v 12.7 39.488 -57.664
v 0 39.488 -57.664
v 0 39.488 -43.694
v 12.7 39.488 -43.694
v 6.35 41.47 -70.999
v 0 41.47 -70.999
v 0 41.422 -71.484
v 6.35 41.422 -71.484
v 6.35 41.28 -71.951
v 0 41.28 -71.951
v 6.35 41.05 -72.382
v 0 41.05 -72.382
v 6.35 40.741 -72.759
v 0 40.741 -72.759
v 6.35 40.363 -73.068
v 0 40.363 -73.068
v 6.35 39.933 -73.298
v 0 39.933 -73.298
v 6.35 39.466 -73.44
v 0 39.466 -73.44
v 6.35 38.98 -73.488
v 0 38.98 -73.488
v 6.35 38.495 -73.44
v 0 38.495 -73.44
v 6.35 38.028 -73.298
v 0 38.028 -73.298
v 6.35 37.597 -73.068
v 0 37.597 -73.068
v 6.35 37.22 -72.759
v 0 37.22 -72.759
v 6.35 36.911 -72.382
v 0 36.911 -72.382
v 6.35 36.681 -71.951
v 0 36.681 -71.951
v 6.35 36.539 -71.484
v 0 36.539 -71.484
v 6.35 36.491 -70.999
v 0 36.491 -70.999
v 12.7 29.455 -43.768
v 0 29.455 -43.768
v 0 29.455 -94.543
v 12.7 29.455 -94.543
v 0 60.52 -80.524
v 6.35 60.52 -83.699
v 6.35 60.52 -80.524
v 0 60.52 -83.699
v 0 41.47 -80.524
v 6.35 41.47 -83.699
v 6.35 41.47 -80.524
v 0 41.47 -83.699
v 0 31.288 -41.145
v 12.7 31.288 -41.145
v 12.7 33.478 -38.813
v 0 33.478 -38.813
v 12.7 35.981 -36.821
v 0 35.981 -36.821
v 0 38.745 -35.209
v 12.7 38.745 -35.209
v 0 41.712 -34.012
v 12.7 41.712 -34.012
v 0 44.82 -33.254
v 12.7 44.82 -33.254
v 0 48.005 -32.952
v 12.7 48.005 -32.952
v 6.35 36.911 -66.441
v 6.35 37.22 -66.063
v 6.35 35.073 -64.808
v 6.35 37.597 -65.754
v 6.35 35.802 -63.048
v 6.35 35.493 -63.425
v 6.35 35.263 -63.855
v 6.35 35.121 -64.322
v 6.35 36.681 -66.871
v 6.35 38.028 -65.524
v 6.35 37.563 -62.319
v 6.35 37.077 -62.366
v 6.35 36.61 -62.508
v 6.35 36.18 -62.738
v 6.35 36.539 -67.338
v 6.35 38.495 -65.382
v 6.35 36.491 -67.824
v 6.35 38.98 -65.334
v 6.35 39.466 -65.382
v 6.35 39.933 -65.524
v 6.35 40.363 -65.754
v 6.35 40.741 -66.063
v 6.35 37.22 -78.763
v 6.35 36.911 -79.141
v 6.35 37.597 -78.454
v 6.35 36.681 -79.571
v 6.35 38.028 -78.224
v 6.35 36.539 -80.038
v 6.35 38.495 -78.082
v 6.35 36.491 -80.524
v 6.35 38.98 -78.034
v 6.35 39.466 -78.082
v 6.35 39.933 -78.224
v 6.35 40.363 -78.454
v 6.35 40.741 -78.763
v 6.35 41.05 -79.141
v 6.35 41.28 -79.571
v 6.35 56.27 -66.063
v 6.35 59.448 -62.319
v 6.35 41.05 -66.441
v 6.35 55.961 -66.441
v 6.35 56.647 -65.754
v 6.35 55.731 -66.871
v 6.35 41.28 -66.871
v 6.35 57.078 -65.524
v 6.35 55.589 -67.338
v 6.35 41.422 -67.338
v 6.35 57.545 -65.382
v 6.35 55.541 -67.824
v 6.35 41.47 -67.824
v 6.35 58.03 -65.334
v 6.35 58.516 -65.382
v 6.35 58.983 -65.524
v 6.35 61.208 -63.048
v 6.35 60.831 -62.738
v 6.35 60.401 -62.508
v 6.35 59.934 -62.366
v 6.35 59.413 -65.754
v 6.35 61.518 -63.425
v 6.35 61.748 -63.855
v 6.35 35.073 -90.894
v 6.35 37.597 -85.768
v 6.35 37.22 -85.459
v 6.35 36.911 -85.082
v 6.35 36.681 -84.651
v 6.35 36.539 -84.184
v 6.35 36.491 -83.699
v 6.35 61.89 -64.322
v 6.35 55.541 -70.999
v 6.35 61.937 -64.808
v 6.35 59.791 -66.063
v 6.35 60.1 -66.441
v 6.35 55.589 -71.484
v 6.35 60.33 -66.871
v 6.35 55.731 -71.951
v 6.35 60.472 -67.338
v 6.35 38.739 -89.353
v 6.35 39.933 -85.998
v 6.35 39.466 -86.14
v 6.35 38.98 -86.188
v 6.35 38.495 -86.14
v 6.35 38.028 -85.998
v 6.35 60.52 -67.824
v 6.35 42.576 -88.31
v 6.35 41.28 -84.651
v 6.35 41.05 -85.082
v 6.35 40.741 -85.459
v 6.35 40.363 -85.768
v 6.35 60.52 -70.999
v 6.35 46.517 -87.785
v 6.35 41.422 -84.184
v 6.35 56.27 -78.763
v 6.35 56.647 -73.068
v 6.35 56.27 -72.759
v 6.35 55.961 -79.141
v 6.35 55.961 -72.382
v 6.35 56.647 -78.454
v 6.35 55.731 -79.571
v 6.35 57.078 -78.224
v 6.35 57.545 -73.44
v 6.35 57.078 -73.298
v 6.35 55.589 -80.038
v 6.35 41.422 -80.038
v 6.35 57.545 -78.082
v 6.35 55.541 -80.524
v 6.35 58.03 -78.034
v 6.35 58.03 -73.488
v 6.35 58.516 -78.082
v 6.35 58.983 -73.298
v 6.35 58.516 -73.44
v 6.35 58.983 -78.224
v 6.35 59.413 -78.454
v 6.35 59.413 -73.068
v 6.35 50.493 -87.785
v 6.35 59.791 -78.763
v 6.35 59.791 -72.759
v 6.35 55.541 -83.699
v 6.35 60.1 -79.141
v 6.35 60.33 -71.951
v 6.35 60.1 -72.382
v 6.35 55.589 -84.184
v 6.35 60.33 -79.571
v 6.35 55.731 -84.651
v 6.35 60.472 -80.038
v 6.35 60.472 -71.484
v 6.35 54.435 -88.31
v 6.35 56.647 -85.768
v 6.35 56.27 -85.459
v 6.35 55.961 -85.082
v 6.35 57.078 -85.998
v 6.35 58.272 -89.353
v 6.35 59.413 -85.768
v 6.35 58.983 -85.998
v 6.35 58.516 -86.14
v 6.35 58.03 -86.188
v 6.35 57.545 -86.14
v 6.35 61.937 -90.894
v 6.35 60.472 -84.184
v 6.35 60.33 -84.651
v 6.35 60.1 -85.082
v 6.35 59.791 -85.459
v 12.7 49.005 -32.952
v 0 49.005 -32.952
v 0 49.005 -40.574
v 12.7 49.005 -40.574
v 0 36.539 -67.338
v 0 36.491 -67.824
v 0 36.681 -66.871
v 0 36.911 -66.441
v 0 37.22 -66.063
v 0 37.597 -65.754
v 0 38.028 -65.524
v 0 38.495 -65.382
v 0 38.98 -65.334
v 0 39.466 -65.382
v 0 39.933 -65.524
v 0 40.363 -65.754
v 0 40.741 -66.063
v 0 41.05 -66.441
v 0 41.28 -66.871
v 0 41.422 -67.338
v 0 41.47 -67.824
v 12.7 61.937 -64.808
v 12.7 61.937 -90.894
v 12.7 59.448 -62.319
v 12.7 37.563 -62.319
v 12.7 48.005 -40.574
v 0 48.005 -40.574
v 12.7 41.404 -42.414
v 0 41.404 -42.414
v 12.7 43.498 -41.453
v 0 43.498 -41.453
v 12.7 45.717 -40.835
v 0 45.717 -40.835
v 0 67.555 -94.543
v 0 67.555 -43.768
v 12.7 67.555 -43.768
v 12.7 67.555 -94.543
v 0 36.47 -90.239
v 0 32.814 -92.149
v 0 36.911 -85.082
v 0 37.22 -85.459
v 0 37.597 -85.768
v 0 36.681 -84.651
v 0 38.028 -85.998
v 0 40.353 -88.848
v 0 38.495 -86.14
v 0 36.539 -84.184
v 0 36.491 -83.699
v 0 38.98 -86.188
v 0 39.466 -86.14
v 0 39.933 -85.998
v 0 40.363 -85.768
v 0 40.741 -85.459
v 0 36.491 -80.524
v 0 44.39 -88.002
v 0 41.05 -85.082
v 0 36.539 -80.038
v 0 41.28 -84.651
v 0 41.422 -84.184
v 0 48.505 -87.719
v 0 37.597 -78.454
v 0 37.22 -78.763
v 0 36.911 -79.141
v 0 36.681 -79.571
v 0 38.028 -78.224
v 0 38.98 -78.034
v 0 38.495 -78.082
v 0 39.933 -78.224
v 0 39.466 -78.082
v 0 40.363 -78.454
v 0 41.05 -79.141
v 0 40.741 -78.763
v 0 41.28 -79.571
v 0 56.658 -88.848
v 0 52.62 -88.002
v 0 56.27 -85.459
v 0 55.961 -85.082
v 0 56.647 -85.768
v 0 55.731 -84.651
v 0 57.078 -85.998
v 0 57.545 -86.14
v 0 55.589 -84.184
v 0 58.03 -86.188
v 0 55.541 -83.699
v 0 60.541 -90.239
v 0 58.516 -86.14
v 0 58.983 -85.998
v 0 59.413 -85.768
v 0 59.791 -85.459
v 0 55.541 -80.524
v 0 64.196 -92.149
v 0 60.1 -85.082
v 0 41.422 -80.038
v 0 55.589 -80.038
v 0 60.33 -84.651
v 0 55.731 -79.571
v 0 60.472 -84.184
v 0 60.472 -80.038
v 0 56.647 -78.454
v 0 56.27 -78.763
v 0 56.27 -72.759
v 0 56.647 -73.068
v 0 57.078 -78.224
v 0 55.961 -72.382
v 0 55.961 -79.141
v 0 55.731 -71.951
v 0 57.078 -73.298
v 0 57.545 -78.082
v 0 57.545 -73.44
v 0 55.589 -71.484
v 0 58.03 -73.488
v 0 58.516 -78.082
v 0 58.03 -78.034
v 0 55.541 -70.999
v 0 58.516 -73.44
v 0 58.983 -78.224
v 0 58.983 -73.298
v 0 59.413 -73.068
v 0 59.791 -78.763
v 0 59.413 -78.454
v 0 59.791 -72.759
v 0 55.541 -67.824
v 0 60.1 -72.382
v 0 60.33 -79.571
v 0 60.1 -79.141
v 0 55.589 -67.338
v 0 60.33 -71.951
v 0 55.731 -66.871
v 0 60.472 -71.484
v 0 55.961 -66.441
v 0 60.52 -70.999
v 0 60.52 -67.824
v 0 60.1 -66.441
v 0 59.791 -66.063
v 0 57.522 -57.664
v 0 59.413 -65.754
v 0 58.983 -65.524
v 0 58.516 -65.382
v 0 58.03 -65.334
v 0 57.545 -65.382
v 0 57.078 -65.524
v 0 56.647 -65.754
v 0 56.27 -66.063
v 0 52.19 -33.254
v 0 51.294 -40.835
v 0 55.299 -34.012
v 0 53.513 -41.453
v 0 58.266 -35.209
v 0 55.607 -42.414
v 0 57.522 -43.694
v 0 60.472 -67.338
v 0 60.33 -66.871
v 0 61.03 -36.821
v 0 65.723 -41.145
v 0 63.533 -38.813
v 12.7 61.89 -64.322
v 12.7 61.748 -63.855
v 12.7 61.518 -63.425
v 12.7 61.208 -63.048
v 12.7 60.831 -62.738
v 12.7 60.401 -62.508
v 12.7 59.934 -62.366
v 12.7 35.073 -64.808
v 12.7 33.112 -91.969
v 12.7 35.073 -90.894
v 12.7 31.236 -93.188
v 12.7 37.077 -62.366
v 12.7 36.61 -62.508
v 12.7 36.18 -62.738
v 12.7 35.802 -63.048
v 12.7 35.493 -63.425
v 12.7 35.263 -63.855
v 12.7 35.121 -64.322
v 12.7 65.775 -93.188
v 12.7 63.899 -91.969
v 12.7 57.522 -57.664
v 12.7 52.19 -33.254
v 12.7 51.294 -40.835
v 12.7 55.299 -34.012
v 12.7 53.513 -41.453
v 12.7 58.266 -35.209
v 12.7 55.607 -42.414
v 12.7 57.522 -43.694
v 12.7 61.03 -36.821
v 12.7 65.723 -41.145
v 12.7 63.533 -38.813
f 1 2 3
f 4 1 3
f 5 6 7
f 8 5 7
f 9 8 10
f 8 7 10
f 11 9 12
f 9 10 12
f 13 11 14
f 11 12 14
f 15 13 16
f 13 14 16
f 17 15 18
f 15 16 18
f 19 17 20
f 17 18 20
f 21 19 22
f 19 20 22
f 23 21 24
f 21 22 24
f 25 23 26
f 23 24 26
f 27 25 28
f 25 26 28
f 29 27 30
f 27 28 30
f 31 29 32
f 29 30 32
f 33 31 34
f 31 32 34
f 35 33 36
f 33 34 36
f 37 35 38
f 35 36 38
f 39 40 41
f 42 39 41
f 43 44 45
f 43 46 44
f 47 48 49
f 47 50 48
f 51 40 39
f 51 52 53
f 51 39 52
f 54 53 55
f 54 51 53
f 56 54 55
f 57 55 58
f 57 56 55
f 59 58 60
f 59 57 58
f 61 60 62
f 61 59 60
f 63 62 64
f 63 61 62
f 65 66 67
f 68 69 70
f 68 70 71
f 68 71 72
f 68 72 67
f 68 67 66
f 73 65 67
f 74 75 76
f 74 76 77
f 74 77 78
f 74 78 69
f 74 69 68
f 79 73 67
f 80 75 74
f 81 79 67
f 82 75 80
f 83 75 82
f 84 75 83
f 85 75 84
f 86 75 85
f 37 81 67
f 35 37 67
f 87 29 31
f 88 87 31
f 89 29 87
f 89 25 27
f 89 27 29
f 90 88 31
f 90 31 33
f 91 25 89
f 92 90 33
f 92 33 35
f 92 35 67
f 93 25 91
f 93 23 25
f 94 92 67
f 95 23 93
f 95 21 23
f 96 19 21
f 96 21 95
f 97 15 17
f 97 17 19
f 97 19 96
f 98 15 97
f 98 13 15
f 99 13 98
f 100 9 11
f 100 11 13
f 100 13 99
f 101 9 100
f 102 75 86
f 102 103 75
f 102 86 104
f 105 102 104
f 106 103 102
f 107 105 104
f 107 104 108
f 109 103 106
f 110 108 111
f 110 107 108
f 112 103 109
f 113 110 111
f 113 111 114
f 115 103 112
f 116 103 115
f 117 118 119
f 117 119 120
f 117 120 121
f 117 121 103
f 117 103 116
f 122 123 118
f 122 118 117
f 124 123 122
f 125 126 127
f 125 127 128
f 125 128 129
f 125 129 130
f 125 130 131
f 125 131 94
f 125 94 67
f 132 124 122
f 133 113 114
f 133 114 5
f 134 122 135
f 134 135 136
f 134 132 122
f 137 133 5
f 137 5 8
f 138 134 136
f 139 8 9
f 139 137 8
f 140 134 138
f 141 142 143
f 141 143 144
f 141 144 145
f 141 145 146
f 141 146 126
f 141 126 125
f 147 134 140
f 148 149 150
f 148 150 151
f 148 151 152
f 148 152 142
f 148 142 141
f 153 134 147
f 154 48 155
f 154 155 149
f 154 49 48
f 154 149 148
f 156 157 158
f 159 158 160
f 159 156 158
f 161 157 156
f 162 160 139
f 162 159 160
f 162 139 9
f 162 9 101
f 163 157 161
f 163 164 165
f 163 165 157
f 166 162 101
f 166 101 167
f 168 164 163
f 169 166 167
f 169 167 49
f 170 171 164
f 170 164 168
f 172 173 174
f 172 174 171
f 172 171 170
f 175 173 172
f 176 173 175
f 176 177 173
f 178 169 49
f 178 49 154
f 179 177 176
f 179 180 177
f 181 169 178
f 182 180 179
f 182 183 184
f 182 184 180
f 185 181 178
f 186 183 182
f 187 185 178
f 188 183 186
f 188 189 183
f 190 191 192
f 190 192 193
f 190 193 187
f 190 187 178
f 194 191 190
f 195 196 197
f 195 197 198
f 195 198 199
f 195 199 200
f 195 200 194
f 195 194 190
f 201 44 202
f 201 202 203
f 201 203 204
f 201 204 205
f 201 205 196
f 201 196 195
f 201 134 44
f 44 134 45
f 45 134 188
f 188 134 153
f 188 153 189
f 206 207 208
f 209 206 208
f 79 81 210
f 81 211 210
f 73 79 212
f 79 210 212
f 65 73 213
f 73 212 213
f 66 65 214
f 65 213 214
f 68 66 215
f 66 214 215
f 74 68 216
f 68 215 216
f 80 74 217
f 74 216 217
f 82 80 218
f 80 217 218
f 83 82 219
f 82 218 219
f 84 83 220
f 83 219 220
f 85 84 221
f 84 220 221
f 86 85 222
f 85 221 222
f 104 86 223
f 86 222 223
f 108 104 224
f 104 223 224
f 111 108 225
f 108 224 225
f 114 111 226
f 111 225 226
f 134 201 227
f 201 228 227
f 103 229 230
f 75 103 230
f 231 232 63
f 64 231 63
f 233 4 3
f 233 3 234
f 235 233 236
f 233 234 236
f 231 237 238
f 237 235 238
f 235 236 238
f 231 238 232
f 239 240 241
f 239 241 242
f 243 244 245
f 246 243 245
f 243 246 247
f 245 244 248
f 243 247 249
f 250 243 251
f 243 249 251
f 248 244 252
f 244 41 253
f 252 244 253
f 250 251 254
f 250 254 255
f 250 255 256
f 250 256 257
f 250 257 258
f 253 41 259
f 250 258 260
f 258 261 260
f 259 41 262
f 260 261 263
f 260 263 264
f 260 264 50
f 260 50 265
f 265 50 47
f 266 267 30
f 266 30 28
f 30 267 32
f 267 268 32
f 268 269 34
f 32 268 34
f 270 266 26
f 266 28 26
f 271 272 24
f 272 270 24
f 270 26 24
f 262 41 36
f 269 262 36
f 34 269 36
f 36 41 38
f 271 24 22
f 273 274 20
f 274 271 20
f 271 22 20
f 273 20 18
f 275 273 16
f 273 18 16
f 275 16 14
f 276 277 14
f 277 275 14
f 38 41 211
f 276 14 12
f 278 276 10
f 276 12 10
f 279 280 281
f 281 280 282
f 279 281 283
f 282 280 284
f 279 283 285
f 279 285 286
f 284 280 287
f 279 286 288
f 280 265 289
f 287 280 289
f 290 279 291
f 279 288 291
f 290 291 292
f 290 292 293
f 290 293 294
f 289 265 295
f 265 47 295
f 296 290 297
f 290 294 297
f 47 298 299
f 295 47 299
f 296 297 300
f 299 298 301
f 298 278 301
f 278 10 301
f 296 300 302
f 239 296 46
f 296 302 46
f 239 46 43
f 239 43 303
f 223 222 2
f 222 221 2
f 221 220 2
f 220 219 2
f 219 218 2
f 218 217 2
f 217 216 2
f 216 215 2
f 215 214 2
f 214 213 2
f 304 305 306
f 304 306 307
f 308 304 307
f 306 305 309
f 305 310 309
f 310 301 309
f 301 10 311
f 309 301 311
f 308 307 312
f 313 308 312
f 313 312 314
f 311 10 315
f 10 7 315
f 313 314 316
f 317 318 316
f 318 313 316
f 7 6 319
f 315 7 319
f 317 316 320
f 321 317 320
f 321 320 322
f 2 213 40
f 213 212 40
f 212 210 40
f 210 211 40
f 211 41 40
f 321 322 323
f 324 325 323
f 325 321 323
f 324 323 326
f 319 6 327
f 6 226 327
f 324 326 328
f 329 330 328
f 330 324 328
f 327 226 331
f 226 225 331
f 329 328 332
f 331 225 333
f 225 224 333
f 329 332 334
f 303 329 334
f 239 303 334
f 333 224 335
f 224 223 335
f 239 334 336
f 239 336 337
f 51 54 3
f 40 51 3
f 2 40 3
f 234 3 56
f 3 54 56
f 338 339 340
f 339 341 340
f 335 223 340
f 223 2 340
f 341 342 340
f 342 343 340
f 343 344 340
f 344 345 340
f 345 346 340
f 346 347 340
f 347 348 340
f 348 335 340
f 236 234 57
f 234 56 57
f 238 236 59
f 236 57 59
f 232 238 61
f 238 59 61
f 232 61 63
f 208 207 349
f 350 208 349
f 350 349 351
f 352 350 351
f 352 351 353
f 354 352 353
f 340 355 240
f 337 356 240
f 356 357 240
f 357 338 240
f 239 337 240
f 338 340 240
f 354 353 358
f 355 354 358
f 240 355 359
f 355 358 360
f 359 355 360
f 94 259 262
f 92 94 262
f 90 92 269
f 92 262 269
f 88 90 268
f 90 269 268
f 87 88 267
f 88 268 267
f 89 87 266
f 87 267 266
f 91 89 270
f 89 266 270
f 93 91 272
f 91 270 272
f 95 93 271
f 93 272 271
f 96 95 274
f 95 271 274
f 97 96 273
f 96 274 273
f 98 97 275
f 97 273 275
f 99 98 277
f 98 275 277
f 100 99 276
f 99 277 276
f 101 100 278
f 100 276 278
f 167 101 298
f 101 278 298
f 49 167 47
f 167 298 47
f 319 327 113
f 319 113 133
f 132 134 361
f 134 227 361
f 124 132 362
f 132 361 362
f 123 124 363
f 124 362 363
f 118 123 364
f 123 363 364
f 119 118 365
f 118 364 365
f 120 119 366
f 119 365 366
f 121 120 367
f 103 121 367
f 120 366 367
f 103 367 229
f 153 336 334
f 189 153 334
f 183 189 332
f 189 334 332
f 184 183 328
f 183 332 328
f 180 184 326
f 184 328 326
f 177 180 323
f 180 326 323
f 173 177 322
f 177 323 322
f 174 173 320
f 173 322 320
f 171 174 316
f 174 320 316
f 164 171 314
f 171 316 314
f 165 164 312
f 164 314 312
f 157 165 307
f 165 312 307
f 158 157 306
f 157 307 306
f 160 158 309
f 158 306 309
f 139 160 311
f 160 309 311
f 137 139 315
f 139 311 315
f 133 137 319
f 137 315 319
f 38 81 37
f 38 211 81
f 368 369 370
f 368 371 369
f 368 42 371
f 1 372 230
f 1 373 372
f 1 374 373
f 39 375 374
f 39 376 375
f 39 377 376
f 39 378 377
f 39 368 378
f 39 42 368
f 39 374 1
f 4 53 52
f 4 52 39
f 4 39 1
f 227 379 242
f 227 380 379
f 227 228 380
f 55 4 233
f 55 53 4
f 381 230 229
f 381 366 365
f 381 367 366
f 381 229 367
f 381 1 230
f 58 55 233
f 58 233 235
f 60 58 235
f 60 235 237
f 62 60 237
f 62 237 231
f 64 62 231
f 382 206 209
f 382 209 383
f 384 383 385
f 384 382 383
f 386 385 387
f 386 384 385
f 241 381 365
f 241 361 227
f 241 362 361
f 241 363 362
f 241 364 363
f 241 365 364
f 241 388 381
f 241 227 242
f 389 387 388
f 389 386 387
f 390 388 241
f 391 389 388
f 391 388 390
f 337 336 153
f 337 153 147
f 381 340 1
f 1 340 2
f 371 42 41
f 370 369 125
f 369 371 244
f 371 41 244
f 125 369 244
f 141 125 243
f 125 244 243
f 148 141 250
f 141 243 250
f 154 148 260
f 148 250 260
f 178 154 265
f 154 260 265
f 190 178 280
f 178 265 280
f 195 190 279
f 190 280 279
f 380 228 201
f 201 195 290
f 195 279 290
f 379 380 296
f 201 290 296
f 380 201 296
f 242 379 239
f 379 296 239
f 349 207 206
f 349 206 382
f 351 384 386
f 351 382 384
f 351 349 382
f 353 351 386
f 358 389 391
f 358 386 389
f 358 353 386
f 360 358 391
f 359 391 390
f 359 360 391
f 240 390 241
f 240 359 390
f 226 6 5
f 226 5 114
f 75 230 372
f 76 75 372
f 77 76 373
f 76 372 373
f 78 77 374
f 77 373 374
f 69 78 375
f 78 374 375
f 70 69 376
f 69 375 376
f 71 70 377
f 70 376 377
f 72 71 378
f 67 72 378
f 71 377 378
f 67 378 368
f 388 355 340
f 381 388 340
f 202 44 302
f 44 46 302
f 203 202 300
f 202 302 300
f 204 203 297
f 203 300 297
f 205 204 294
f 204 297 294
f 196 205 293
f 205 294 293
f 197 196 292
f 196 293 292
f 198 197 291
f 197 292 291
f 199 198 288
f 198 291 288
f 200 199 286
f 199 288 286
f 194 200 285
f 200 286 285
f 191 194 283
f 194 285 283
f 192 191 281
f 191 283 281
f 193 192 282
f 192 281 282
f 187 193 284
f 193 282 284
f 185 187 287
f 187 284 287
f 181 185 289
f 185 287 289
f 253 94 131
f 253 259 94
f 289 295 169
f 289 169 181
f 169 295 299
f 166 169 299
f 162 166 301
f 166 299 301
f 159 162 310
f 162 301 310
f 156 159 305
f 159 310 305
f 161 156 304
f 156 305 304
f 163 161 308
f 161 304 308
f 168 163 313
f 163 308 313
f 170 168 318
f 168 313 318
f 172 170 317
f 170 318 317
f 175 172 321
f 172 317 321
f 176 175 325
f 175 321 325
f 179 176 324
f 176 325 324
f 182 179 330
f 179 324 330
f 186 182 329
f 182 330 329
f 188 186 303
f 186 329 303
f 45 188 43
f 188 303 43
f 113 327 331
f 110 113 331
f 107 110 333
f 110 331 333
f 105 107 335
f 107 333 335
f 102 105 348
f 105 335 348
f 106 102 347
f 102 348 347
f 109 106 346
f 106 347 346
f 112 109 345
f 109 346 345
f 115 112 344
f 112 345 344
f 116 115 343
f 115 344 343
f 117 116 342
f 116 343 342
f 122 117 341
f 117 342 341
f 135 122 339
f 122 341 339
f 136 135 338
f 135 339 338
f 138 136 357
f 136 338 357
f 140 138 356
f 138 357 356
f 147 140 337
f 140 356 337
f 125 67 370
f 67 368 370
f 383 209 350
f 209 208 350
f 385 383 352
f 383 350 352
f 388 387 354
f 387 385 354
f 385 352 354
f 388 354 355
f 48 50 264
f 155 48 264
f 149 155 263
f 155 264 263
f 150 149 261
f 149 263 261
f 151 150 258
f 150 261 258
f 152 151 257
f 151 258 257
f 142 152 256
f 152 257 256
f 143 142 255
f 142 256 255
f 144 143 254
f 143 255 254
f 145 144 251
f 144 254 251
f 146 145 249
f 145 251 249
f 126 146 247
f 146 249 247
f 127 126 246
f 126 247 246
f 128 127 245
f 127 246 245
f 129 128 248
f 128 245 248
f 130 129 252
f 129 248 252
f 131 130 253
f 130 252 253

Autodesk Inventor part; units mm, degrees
ref_plane "YZ Plane" through (0, 0, 0) normal (1, 0, 0) x (0, 1, 0)
ref_plane "XZ Plane" through (0, 0, 0) normal (0, 1, 0) x (-1, 0, 0)
ref_plane "XY Plane" through (0, 0, 0) normal (0, 0, 1) x (1, 0, 0)
sketch "Sketch1" plane through (0, 0, 0) normal (1, 0, 0) x (0, 1, 0)
  line L0 (57.5224, -43.6936) -> (57.5224, -57.6636)
  line L1 (57.5224, -57.6636) -> (39.4884, -57.6636)
  line L2 (39.4884, -57.6636) -> (39.4884, -43.6936)
  arc A0 (57.5224, -43.6936) -> (49.0054, -40.5737) centre (48.5054, -55.1236) ccw
  line L3 (67.5554, -43.7679) -> (67.5554, -94.5433)
  line L4 (29.4554, -43.7679) -> (29.4554, -94.5433)
  arc A1 (67.5554, -43.7679) -> (49.0054, -32.9515) centre (48.5054, -55.1236) ccw
  arc A2 (67.5554, -94.5433) -> (29.4554, -94.5433) centre (48.5054, -117.7186) ccw
  line L5 (60.5196, -70.9986) -> (60.5196, -67.8236)
  line L6 (55.5412, -67.8236) -> (55.5412, -70.9986)
  arc A3 (60.5196, -67.8236) -> (55.5412, -67.8236) centre (58.0304, -67.8236) ccw
  arc A4 (55.5412, -70.9986) -> (60.5196, -70.9986) centre (58.0304, -70.9986) ccw
  arc A5 (60.5196, -80.5236) -> (55.5412, -80.5236) centre (58.0304, -80.5236) ccw
  line L7 (60.5196, -83.6986) -> (60.5196, -80.5236)
  arc A6 (55.5412, -83.6986) -> (60.5196, -83.6986) centre (58.0304, -83.6986) ccw
  line L8 (55.5412, -80.5236) -> (55.5412, -83.6986)
  arc A7 (41.4696, -67.8236) -> (36.4912, -67.8236) centre (38.9804, -67.8236) ccw
  line L9 (41.4696, -70.9986) -> (41.4696, -67.8236)
  arc A8 (36.4912, -70.9986) -> (41.4696, -70.9986) centre (38.9804, -70.9986) ccw
  line L10 (36.4912, -67.8236) -> (36.4912, -70.9986)
  arc A9 (41.4696, -80.5236) -> (36.4912, -80.5236) centre (38.9804, -80.5236) ccw
  line L11 (41.4696, -83.6986) -> (41.4696, -80.5236)
  arc A10 (36.4912, -83.6986) -> (41.4696, -83.6986) centre (38.9804, -83.6986) ccw
  line L12 (36.4912, -80.5236) -> (36.4912, -83.6986)
  line L13 (48.5054, -117.7186) -> (48.5054, -32.9436) construction
  line L14 (57.5224, -50.6786) -> (39.4884, -50.6786) construction
  line L15 (48.0054, -40.5737) -> (48.0054, -32.9515)
  line L16 (49.0054, -32.9515) -> (49.0054, -40.5737)
  arc A11 (49.0054, -32.9515) -> (48.0054, -32.9515) centre (48.5054, -55.1236) ccw construction
  arc A12 (48.0054, -32.9515) -> (29.4554, -43.7679) centre (48.5054, -55.1236) ccw
  arc A13 (48.0054, -40.5737) -> (39.4884, -43.6936) centre (48.5054, -55.1236) ccw
  arc A14 (49.0054, -40.5737) -> (48.0054, -40.5737) centre (48.5054, -55.1236) ccw construction
  point P0 (0, 0)
  point P1 (48.5054, -40.5636)
  point P2 (48.5054, -50.6786)
  dimension "d0" = 13.97
  dimension "d1" = 18.034
  dimension "d2" = 2.54
  dimension "d4" = 30
  dimension "d8" = 4.9784
  dimension "d9" = 2.4892
  dimension "d17" = 3.175
  dimension "d20" = 12.7
  dimension "d23" = 19.05
  dimension "d26" = 38.1
  dimension "d30" = 10.16
  dimension "d31" = 7.62
  dimension "d32" = 67.04
  dimension "d33" = 1
extrude "Extrusion1" add sketch "Sketch1" along normal blind 12.7
sketch "Sketch2" plane through (12.7, 0, 0) normal (1, 0, 0) x (0, 0, -1)
  arc A0 (94.5433, 67.5554) -> (94.5433, 29.4554) centre (117.7186, 48.5054) ccw projected
  line L0 (90.8936, 61.9374) -> (64.8078, 61.9374)
  line L1 (62.3186, 59.4482) -> (62.3186, 37.5626)
  line L2 (64.8078, 35.0734) -> (90.8936, 35.0734)
  line L3 (87.7186, 48.5054) -> (62.3186, 48.5054) construction
  arc A1 (64.8078, 61.9374) -> (62.3186, 59.4482) centre (64.8078, 59.4482) ccw
  arc A2 (62.3186, 37.5626) -> (64.8078, 35.0734) centre (64.8078, 37.5626) ccw
  point P0 (0, 0)
  point P1 (62.3186, 61.9374)
  dimension "d37" = 25.4
  dimension "d38" = 28.575
  dimension "d39" = 2.4892
extrude "Extrusion2" cut sketch "Sketch2" against normal blind 6.35
properties part number "motormount2"
